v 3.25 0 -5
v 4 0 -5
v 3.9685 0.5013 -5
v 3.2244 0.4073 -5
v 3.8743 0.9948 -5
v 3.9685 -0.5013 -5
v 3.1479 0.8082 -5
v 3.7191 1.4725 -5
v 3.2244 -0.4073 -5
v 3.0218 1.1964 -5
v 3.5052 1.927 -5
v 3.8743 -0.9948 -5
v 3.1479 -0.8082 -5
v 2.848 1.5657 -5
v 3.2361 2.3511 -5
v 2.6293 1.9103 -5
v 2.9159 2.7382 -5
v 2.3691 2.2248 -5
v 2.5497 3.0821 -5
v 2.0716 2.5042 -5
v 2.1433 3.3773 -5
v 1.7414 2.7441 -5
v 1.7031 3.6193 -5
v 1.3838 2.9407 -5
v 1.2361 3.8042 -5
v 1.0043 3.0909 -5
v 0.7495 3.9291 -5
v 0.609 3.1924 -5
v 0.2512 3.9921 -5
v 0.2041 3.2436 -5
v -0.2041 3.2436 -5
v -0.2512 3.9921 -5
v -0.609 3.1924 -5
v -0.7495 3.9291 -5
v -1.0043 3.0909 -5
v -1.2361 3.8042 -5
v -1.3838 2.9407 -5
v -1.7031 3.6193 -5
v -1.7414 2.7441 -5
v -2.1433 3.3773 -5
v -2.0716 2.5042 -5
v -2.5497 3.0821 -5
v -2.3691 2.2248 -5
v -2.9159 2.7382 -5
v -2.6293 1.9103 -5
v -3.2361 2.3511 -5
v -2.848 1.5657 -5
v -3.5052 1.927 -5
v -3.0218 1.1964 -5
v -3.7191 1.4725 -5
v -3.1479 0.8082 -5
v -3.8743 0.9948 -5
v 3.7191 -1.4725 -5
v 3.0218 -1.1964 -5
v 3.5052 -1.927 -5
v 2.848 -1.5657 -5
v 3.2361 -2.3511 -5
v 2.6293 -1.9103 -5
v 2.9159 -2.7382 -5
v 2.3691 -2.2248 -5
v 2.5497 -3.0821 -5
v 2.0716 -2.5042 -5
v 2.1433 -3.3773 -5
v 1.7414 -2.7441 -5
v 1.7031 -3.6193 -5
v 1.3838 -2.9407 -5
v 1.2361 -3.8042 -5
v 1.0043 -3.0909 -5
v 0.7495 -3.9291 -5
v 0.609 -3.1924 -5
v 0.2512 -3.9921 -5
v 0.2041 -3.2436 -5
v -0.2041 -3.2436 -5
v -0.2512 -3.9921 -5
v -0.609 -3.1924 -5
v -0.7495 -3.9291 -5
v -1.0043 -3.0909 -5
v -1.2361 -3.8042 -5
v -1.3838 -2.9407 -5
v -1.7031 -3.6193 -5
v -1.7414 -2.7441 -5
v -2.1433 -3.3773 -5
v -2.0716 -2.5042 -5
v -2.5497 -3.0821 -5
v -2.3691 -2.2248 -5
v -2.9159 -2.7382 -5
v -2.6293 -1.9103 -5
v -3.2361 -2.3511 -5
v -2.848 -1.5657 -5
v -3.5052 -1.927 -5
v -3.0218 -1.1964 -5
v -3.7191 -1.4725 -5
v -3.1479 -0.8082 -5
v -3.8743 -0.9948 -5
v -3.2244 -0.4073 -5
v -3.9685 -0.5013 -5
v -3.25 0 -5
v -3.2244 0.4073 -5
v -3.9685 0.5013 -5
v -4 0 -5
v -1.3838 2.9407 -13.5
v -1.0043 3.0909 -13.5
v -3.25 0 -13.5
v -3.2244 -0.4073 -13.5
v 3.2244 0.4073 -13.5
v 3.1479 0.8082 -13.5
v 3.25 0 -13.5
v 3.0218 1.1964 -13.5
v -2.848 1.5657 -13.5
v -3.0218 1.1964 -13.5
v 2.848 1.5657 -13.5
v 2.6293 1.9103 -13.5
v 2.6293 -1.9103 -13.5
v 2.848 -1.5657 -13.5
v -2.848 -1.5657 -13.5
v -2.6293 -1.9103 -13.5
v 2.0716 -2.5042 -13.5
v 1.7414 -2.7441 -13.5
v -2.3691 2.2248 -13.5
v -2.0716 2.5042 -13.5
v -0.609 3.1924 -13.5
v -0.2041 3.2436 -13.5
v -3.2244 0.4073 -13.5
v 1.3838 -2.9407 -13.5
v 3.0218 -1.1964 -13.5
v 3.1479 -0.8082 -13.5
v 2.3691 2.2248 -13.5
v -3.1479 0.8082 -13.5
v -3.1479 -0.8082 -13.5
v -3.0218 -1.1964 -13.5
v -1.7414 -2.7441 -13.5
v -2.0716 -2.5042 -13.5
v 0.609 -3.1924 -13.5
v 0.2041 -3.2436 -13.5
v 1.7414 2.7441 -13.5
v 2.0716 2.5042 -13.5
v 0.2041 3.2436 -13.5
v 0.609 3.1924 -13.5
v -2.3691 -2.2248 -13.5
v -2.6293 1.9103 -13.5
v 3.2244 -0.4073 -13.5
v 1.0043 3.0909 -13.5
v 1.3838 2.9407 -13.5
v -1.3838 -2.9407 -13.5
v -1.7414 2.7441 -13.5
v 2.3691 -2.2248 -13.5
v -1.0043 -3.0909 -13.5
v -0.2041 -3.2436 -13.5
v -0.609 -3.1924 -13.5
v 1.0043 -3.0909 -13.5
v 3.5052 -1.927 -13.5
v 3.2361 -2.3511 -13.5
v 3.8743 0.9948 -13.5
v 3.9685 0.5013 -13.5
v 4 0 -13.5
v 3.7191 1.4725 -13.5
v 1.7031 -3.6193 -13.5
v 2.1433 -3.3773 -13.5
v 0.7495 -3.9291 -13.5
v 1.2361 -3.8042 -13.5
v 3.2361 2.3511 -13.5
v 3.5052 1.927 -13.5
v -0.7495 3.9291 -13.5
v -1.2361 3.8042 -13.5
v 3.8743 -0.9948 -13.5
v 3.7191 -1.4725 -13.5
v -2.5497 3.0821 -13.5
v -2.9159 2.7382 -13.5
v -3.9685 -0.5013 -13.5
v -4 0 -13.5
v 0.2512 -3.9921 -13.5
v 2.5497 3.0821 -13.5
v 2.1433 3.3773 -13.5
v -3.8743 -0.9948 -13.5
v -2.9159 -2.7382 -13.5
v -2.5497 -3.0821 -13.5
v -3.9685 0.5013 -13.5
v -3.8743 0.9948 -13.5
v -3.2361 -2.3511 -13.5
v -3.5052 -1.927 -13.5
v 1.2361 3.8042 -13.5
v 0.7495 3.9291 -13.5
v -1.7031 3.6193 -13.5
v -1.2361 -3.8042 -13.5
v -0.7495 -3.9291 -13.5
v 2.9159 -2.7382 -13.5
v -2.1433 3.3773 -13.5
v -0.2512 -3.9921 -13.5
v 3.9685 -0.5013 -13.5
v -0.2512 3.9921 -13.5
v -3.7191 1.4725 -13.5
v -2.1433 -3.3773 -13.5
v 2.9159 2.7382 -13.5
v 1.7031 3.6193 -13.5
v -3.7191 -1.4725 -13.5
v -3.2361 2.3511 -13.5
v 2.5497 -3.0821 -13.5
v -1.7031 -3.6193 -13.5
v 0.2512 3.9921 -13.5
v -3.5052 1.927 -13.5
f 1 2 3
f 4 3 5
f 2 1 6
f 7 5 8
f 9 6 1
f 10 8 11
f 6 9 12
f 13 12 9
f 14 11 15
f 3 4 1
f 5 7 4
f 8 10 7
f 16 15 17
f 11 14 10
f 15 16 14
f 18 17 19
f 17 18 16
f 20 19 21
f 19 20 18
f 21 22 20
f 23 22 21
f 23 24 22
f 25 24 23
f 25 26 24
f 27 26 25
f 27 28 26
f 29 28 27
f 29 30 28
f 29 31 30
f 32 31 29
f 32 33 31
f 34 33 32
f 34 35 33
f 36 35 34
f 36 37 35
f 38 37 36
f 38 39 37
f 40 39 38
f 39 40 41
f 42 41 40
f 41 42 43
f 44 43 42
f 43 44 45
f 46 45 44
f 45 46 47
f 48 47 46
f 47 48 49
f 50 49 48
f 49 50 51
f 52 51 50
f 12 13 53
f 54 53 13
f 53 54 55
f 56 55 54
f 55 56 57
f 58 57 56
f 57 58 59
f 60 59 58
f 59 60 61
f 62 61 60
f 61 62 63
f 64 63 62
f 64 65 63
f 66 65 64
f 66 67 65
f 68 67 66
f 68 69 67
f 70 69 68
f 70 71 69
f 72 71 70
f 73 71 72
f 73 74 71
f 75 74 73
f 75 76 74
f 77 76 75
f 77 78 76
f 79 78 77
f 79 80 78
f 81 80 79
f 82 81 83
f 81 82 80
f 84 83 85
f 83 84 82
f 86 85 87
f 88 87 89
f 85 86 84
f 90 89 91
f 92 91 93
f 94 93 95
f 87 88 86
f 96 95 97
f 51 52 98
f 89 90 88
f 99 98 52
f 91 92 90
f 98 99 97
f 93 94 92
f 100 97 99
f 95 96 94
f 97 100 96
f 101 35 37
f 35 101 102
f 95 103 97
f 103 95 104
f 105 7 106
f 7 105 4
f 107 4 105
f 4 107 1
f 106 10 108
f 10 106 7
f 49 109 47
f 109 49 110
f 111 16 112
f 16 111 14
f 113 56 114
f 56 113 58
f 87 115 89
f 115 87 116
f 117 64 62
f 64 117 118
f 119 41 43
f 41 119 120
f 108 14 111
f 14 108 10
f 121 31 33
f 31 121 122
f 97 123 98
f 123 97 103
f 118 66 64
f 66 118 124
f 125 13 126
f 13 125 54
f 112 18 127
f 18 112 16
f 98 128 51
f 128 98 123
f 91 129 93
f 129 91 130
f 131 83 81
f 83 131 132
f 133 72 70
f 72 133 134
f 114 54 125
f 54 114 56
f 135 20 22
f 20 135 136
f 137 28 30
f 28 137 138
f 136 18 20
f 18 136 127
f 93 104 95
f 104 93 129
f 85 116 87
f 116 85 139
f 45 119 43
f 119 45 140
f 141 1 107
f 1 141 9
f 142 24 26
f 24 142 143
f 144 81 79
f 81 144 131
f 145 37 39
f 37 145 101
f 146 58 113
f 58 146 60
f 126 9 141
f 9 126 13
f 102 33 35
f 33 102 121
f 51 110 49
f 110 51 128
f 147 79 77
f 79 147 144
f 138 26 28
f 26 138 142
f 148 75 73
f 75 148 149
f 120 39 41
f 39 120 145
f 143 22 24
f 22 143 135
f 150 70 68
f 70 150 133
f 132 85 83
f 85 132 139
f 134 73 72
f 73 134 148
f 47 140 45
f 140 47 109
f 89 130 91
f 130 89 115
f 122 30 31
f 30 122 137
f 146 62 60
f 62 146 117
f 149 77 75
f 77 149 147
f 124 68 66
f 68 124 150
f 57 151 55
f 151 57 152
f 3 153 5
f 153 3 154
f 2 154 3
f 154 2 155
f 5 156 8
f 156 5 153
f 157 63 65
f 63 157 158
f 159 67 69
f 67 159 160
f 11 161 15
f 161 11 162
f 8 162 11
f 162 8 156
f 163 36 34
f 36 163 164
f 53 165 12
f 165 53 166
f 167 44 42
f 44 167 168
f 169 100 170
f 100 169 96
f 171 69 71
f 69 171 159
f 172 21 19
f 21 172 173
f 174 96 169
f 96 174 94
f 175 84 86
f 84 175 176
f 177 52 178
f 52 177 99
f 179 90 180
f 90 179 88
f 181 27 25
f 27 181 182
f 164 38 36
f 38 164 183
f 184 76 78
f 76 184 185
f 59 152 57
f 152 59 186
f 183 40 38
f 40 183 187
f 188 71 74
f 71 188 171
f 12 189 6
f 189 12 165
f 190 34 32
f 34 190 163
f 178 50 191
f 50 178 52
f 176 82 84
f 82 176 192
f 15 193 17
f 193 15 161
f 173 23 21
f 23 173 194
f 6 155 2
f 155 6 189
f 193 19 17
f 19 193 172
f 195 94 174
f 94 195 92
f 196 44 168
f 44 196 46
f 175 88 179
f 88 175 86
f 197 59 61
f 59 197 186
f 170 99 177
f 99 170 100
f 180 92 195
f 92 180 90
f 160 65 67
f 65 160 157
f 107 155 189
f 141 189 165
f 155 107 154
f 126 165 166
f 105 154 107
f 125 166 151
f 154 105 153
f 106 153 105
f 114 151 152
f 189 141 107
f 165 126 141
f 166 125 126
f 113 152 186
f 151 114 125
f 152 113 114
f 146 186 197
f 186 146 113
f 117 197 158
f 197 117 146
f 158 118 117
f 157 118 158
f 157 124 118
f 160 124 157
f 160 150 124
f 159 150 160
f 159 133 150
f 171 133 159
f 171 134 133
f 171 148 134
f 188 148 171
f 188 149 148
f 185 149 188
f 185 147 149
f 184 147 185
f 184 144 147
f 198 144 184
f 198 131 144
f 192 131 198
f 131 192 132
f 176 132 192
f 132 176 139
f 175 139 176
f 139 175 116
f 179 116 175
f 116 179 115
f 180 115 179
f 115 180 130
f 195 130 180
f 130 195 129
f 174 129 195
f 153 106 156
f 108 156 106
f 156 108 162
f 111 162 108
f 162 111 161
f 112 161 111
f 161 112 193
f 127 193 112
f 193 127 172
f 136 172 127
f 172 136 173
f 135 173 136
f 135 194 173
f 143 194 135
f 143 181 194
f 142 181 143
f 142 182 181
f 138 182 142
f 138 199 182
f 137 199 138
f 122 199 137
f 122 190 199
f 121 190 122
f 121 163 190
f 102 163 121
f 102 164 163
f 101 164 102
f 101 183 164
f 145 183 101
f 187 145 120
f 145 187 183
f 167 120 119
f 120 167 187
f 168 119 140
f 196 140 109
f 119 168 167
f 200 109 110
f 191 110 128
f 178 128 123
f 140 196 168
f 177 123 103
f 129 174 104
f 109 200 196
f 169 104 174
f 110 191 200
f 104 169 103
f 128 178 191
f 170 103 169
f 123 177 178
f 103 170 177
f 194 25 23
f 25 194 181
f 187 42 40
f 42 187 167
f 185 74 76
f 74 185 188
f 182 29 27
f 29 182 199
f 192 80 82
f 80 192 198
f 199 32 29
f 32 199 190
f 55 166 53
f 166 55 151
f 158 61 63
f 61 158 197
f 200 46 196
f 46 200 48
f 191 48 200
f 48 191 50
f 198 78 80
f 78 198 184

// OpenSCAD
$fn = 50;

difference() {
	union() {
		translate(v = [0, 0, -13.5]) {
			cylinder(h = 13.5, r = 4.0);
		}
	}
	union() {
		translate(v = [0, 0, 0]) {
			rotate(a = [0, 0, 0]) {
				difference() {
					union() {
						translate(v = [0, 0, -5]) {
							linear_extrude(height = 5) {
								polygon(points = [[5.914249999999999, 0.0], [2.957125, 5.1218907443321156], [-2.9571249999999982, 5.1218907443321156], [-5.914249999999999, 7.242867331857232e-16], [-2.9571250000000022, -5.121890744332115], [2.9571249999999956, -5.121890744332118]]);
							}
						}
					}
					union();
				}
			}
		}
		#translate(v = [0, 0, -100.0]) {
			cylinder(h = 200, r = 3.25);
		}
	}
}
